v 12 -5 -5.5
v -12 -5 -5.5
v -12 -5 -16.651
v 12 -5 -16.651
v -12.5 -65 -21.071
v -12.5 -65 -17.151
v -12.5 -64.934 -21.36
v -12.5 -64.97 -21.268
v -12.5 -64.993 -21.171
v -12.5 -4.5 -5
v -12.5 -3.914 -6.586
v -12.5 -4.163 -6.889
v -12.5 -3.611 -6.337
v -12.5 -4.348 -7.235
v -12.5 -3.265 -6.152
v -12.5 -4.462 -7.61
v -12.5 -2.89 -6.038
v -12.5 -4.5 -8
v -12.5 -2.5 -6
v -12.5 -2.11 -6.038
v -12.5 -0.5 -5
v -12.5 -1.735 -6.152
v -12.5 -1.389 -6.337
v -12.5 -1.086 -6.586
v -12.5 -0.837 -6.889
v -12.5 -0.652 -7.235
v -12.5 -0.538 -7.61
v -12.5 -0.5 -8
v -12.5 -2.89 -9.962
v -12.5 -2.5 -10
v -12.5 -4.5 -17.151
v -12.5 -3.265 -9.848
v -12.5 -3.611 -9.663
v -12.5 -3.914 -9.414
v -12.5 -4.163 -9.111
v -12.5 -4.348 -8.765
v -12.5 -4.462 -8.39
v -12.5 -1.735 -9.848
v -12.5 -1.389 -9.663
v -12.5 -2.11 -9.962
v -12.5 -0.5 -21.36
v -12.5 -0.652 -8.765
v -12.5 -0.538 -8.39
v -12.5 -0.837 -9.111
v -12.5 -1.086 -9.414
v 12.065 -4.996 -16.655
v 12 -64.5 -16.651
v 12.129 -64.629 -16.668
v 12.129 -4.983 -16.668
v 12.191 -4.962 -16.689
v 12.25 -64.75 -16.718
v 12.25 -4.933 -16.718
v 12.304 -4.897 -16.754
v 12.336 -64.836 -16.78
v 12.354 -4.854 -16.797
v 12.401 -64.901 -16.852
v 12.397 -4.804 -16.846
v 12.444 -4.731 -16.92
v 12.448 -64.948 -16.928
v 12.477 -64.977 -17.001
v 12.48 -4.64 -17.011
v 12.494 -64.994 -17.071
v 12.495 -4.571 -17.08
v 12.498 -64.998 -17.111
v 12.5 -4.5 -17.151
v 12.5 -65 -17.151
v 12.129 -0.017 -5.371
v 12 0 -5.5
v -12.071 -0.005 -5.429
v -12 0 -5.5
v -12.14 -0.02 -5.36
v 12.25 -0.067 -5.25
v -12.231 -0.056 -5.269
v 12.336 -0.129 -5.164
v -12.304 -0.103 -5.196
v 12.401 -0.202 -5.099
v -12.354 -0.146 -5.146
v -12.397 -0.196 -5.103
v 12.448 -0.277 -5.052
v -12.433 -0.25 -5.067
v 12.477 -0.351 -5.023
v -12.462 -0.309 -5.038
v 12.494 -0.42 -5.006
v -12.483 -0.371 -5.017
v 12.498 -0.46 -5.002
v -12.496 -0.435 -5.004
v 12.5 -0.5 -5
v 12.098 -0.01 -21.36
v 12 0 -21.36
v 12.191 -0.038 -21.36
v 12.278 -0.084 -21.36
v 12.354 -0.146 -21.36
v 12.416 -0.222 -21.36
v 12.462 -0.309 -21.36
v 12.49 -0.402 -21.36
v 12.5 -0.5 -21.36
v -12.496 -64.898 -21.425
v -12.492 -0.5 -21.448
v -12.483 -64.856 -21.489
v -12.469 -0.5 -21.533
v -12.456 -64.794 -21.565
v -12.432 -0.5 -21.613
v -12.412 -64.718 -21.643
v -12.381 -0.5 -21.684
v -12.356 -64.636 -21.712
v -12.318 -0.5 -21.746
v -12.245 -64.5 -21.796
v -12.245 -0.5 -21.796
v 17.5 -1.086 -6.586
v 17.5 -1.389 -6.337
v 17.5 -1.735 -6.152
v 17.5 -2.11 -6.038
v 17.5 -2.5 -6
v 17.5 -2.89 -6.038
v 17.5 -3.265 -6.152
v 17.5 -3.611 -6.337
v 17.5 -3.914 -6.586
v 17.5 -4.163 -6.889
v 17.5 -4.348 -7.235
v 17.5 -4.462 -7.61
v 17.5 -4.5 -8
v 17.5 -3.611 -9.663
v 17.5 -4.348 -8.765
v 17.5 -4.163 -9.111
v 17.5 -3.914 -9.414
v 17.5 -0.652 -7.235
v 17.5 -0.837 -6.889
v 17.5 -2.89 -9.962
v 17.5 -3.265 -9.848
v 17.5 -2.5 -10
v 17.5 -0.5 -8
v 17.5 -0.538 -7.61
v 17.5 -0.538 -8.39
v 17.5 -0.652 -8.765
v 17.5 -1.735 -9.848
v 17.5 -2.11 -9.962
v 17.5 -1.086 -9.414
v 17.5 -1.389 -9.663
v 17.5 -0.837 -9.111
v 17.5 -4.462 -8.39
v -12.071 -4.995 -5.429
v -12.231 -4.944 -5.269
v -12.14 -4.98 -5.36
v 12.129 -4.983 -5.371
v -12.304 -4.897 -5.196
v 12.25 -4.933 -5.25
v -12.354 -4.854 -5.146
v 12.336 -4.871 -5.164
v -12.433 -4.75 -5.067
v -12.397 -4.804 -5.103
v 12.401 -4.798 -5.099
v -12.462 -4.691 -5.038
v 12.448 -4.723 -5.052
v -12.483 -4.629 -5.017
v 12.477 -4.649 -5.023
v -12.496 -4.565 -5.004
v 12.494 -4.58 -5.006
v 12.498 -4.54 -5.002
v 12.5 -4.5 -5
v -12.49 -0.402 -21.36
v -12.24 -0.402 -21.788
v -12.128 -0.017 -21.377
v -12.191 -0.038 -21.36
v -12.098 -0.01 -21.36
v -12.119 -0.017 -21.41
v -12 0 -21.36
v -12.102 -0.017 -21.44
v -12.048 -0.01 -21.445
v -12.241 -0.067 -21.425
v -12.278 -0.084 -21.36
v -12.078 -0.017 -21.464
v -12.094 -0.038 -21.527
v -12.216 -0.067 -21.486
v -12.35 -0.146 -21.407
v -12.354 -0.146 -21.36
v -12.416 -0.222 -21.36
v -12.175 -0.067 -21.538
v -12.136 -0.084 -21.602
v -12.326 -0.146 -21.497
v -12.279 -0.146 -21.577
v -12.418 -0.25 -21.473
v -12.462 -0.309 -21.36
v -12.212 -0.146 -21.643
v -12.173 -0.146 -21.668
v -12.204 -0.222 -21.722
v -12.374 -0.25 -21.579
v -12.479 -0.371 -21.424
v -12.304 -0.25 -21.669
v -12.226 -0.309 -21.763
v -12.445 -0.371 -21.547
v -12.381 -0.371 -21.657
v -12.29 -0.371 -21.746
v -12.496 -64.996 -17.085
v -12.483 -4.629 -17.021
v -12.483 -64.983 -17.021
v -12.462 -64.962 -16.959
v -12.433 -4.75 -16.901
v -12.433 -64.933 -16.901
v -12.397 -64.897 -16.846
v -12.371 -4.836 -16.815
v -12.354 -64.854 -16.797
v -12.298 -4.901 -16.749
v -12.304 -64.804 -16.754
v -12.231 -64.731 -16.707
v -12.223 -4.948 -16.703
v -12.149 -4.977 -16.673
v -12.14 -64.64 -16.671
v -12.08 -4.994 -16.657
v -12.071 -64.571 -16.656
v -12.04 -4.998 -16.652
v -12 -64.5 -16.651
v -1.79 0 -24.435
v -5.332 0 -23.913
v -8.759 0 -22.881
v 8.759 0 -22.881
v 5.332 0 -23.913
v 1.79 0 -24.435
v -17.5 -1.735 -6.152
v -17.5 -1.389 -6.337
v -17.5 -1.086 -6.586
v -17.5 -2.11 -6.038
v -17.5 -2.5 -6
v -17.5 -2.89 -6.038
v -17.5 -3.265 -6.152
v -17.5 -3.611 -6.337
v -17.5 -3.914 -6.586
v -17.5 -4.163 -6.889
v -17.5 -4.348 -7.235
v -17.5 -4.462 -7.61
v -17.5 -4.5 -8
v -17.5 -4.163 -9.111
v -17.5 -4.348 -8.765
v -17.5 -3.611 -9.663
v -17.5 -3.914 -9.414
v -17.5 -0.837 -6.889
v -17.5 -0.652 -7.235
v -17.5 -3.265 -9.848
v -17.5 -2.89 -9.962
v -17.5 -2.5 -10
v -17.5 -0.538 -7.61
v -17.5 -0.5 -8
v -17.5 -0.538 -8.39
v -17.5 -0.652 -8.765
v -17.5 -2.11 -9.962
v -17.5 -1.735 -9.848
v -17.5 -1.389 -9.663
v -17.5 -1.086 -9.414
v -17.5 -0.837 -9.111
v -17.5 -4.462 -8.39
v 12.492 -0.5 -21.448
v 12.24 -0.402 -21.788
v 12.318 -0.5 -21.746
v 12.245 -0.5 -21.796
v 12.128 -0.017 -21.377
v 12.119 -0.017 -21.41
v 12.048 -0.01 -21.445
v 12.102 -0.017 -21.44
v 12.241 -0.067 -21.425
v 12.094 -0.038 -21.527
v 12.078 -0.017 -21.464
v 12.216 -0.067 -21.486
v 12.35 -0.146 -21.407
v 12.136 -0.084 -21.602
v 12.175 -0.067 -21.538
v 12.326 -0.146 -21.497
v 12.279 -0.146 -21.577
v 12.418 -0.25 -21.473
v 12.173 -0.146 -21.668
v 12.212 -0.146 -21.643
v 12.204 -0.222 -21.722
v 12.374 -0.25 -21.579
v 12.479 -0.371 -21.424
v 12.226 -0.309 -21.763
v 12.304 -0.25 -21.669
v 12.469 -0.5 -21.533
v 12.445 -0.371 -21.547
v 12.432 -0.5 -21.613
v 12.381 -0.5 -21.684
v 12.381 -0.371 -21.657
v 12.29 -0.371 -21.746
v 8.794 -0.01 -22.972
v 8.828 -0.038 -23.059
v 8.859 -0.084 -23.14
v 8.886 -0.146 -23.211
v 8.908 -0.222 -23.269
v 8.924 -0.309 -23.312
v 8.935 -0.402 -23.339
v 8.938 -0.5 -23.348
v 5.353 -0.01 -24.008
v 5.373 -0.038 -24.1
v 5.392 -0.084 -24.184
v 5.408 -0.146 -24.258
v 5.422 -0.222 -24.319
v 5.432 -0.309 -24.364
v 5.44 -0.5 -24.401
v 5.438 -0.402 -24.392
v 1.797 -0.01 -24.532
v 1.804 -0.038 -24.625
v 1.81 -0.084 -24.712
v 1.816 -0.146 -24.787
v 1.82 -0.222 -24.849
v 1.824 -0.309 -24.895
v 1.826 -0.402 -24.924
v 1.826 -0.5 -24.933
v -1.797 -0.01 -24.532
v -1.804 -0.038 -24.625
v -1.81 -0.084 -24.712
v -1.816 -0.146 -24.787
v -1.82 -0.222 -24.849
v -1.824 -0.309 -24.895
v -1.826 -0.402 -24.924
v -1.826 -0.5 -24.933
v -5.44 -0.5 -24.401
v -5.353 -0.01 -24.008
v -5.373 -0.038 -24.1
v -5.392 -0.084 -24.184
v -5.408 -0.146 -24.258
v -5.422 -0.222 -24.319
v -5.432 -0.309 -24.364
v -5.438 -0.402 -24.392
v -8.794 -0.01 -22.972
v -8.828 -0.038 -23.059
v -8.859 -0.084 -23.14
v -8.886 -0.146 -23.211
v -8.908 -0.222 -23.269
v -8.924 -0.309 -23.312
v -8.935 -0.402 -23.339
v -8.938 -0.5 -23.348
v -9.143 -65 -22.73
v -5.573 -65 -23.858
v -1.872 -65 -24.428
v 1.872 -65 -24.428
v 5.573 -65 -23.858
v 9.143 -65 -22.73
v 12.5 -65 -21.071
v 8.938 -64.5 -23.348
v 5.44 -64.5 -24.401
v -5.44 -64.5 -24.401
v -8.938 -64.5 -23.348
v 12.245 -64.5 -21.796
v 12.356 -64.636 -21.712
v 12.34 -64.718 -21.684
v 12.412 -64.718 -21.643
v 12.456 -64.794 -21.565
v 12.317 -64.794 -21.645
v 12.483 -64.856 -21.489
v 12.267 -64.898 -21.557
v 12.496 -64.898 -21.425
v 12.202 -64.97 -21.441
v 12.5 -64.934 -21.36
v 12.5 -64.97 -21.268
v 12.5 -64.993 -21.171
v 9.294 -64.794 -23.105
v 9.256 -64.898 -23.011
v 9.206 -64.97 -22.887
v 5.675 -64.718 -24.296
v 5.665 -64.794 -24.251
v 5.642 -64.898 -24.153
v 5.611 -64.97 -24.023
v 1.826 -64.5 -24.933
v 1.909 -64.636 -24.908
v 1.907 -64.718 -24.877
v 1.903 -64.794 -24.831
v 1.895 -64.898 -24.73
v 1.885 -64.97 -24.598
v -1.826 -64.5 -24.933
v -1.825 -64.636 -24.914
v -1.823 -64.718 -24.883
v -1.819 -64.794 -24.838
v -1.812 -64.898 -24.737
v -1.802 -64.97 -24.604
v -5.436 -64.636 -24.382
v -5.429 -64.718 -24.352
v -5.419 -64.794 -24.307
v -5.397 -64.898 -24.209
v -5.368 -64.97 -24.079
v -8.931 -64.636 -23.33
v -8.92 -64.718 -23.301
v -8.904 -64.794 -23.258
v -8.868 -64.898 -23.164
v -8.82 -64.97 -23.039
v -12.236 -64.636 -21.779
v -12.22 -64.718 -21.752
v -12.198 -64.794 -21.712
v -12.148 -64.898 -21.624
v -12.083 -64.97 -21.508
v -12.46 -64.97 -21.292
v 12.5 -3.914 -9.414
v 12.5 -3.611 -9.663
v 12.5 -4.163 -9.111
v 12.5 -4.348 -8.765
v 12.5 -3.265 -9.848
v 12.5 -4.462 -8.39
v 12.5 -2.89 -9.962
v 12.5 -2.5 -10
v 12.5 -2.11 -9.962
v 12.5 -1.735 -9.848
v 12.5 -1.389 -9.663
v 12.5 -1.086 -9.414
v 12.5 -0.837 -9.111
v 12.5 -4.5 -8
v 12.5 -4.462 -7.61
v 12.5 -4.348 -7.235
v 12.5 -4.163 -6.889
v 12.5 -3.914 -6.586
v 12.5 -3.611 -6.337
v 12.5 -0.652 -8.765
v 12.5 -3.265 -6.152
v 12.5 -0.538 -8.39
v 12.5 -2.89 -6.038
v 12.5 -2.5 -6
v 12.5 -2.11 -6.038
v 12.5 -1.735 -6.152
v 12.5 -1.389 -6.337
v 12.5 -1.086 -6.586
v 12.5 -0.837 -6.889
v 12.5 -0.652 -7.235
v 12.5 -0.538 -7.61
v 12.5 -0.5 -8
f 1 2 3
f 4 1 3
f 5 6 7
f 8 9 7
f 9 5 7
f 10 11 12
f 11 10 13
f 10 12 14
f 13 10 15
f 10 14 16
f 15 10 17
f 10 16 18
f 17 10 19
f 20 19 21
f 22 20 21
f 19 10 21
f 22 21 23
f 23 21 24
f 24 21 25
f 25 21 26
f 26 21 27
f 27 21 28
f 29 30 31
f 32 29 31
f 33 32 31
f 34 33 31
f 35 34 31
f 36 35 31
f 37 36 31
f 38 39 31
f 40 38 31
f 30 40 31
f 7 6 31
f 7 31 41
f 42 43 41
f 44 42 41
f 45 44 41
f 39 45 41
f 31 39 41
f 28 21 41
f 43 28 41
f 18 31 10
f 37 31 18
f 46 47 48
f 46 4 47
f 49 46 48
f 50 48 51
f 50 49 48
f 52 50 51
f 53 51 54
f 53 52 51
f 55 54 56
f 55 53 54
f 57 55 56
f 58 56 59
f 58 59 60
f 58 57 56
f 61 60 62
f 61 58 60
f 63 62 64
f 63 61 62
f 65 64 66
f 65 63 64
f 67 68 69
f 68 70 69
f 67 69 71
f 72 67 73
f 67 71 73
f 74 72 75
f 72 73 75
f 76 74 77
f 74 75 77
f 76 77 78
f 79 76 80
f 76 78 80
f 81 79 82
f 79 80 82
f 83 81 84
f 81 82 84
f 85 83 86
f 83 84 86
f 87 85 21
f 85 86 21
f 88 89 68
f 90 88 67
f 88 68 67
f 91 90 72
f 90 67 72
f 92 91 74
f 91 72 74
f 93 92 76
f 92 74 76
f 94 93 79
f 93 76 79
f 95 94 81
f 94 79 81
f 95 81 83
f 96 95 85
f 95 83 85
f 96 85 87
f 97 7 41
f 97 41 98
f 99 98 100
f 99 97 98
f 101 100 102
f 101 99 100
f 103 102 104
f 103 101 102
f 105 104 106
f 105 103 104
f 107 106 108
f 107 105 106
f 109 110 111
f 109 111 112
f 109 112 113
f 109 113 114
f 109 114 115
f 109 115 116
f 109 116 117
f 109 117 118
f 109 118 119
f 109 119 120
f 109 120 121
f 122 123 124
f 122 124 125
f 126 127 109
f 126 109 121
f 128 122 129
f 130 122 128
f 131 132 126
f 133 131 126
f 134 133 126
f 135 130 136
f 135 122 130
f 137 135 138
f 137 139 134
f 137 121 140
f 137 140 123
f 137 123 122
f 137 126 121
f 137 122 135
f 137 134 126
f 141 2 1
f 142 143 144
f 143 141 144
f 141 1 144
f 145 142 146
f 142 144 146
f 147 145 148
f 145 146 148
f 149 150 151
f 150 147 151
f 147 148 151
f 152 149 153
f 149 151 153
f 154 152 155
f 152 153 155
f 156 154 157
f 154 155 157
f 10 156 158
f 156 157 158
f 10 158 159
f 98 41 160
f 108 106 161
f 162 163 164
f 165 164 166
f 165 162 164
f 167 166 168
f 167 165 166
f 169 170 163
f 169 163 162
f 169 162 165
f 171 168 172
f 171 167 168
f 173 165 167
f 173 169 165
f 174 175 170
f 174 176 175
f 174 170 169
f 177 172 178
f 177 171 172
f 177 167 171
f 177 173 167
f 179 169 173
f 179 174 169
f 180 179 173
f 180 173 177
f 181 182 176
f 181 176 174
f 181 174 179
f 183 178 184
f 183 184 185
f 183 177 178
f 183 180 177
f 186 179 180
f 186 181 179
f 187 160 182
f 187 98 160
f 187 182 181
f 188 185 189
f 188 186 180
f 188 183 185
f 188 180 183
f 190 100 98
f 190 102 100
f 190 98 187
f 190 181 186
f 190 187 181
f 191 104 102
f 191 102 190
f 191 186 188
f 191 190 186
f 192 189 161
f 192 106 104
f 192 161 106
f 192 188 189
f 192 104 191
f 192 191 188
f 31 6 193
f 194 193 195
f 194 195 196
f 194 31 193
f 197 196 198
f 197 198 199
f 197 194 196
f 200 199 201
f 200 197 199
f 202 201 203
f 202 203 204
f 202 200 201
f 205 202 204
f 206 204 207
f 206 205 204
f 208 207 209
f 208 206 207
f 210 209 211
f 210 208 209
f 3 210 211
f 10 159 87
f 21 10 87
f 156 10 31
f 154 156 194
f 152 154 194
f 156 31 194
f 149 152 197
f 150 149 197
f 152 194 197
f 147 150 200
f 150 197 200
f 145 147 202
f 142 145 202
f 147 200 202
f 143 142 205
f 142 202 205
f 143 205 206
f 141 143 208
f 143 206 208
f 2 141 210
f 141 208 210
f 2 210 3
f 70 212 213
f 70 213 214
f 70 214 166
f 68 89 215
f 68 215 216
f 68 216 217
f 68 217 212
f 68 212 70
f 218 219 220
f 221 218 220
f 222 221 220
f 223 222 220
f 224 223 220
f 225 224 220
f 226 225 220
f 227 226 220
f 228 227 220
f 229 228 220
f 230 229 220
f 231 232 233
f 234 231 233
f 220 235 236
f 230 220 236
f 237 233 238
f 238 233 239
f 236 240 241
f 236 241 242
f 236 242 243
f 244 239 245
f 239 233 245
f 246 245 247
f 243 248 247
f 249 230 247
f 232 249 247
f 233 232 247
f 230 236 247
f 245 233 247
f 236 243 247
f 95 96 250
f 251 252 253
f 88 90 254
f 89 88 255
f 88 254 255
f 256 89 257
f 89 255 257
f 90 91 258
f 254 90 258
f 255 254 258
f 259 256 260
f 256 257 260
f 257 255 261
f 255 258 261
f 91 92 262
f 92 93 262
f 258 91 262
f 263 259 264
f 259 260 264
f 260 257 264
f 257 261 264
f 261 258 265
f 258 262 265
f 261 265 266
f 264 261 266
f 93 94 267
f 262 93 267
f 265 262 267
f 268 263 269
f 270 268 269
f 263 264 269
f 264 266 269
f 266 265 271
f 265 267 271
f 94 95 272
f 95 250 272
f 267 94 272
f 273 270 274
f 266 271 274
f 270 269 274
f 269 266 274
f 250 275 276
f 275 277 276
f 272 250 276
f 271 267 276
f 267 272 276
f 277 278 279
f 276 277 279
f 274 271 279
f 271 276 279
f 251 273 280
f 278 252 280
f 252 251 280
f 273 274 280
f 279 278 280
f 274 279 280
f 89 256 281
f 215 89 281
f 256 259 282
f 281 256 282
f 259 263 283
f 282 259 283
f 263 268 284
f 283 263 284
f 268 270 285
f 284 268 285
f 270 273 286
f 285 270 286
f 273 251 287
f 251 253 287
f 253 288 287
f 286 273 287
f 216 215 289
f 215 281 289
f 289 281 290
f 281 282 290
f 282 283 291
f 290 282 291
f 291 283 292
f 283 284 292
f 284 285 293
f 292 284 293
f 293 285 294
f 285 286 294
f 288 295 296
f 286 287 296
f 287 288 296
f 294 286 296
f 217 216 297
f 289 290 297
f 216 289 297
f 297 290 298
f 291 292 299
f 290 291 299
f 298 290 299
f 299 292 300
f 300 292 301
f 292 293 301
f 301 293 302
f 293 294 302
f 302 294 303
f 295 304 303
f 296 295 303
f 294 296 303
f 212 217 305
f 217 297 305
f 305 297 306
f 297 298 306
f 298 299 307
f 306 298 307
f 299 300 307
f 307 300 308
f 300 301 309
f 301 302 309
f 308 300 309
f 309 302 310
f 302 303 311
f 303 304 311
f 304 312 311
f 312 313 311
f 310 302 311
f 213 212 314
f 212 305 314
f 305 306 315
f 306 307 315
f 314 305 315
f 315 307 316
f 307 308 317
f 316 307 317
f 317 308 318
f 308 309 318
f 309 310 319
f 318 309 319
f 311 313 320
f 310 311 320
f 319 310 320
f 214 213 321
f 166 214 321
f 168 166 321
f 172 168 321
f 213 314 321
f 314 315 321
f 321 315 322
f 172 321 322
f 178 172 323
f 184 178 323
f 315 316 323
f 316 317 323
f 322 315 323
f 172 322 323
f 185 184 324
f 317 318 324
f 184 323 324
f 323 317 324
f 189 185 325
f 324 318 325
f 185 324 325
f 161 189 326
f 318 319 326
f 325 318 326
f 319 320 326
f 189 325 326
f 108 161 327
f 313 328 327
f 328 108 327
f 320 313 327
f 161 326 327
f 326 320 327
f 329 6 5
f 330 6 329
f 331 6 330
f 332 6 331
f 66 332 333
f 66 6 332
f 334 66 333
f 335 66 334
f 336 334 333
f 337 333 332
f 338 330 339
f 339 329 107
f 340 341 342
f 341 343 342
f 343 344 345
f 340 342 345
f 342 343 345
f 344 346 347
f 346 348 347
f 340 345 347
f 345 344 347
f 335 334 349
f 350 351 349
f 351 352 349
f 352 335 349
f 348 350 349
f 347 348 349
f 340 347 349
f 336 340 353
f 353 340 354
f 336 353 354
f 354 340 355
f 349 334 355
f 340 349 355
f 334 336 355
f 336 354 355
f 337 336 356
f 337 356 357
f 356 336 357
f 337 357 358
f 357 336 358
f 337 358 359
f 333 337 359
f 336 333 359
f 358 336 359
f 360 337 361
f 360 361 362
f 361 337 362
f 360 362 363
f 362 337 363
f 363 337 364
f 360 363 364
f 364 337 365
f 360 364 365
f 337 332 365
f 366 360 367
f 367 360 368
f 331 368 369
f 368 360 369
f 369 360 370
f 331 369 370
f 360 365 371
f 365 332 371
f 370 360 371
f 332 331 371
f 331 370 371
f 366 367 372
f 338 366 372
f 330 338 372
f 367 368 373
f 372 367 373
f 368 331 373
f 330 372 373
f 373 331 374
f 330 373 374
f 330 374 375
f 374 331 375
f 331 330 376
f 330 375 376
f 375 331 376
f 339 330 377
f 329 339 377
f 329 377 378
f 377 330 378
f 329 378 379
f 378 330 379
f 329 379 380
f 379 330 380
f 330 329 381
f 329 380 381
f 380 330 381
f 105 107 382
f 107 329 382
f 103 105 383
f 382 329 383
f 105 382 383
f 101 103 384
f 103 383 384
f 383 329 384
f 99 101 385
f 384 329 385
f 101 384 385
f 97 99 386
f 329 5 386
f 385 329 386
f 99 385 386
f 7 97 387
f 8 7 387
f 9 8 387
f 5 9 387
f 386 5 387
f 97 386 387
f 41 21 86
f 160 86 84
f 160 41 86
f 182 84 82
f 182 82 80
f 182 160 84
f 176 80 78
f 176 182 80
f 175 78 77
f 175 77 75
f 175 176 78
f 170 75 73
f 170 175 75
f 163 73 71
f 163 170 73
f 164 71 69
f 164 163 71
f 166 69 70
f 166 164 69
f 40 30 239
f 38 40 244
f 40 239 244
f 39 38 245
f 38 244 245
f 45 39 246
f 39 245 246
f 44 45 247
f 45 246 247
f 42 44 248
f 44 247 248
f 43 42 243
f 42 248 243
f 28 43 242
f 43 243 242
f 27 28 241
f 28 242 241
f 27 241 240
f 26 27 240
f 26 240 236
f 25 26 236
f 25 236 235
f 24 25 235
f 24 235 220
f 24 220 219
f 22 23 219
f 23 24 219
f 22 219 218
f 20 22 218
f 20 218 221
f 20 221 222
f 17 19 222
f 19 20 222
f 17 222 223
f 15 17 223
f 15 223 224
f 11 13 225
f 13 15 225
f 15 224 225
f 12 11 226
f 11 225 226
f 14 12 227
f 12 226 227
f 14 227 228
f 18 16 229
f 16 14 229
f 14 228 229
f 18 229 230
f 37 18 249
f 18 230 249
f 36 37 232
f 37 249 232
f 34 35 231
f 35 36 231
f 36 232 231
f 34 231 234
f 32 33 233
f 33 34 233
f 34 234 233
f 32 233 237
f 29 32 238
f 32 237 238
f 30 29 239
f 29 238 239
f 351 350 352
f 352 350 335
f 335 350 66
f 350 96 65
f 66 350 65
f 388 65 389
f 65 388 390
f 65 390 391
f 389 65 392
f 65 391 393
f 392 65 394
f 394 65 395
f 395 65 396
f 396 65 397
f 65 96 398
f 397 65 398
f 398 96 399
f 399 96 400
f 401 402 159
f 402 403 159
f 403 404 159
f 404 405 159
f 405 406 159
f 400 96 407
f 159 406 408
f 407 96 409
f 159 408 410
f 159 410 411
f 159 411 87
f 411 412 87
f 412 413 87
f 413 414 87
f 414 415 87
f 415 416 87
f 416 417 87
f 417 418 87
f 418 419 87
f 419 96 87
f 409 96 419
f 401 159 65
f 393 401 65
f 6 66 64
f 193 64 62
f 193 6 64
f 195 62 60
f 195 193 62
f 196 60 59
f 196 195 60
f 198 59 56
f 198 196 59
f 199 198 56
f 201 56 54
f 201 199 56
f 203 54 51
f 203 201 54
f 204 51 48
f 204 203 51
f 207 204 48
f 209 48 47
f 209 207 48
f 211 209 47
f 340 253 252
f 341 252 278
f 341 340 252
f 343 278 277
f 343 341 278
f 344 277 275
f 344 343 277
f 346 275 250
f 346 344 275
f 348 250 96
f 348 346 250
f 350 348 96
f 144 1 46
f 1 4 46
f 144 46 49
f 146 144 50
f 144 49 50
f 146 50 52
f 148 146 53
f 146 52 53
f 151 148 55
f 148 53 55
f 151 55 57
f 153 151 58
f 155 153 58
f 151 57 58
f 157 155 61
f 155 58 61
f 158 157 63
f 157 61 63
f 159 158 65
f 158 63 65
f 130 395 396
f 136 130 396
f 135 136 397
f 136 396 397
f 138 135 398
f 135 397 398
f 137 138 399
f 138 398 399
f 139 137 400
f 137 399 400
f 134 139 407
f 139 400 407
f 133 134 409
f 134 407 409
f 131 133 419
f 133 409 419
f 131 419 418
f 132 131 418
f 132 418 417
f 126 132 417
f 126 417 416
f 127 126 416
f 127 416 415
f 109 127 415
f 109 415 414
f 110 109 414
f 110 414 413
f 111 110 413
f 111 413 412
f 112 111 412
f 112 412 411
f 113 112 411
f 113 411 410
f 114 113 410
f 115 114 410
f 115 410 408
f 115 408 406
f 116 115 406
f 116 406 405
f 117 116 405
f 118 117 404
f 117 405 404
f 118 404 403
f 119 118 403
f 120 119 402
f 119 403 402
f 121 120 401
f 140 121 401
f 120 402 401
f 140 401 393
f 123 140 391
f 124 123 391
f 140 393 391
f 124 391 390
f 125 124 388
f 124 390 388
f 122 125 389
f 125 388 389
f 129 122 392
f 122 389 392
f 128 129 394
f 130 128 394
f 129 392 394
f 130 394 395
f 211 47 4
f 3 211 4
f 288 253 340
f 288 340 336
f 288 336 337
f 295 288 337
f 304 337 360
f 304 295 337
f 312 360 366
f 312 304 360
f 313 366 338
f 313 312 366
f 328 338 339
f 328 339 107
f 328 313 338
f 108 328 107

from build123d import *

# Parameters (mm, degrees)
SKETCH1_R                = 25
BOSS_EXTRUDE1_DEPTH      = 69
CUT_EXTRUDE3_DEPTH       = 69
SKETCH8_W                = 47.613521064
SKETCH8_H                = 96.094714493
CUT_EXTRUDE6_DEPTH       = 69
SKETCH9_W                = 16.650635095
SKETCH9_H                = 64
CUT_EXTRUDE7_DEPTH       = 69
SKETCH10_W               = 5
SKETCH10_H               = 9.23187044
CUT_EXTRUDE8_DEPTH       = 69
BOSS_EXTRUDE2_DEPTH      = 5
BOSS_EXTRUDE2_DEPTH_BACK = 30
SKETCH11_R               = 2
SKETCH12_W               = 21.924143589
SKETCH12_H               = 4
CUT_EXTRUDE9_DEPTH       = 80.284298572
FILLET1_R                = 0.5


with BuildPart() as part:
    # Sketch1 → Boss-Extrude1 (new body)
    with BuildSketch(Plane(origin=(0, 0, 0), x_dir=(1, 0, 0), z_dir=(0, 1, 0))):
        with Locations(Location((0, 0, 0), (0, 0, 270))):
            Circle(SKETCH1_R)
    extrude(amount=-BOSS_EXTRUDE1_DEPTH)

    # Sketch2 → Cut-Extrude3 (cut)
    with BuildSketch(Plane(origin=(0, 0, 0), x_dir=(1, 0, 0), z_dir=(0, 1, 0))):
        with BuildLine():
            Line((-12.5, -21.650635095), (-12.5, 21.650635095))
            ThreePointArc((-12.5, 21.650635095), (-25, 0), (-12.5, -21.650635095))
        make_face()
        with BuildLine():
            ThreePointArc((25, 0), (21.650635095, 12.5), (12.5, 21.650635095))
            Line((12.5, 21.650635095), (12.5, -21.650635095))
            ThreePointArc((12.5, -21.650635095), (21.650635095, -12.5), (25, 0))
        make_face()
    extrude(amount=-CUT_EXTRUDE3_DEPTH, mode=Mode.SUBTRACT)

    # Sketch8 → Cut-Extrude6 (cut)
    with BuildSketch(Plane(origin=(12.5, 0, 0), x_dir=(0, 0, -1), z_dir=(1, 0, 0))):
        with Locations((-23.806760532, -34.608459046)):
            Rectangle(SKETCH8_W, SKETCH8_H)
    extrude(amount=-CUT_EXTRUDE6_DEPTH, mode=Mode.SUBTRACT)

    # Sketch9 → Cut-Extrude7 (cut)
    with BuildSketch(Plane(origin=(12.5, 0, 0), x_dir=(0, 0, -1), z_dir=(1, 0, 0))):
        with Locations((8.325317548, -37)):
            Rectangle(SKETCH9_W, SKETCH9_H)
    extrude(amount=-CUT_EXTRUDE7_DEPTH, mode=Mode.SUBTRACT)

    # Sketch10 → Cut-Extrude8 (cut)
    with BuildSketch(Plane(origin=(12.5, 0, 0), x_dir=(0, 0, -1), z_dir=(1, 0, 0))):
        with Locations((2.5, -4.61593522)):
            Rectangle(SKETCH10_W, SKETCH10_H)
    extrude(amount=-CUT_EXTRUDE8_DEPTH, mode=Mode.SUBTRACT)

    # Sketch11 → Boss-Extrude2 (add, two sides: drawn at the far end of the back side and taken through both)
    with BuildSketch(Plane(origin=(12.5, 0, 0), x_dir=(0, 0, -1), z_dir=(1, 0, 0)).offset(-BOSS_EXTRUDE2_DEPTH_BACK)):
        with Locations((8, -2.5)):
            Circle(SKETCH11_R)
    extrude(amount=BOSS_EXTRUDE2_DEPTH + BOSS_EXTRUDE2_DEPTH_BACK)

    # Sketch12 → Cut-Extrude9 (cut, through all)
    with BuildSketch(Plane(origin=(12.5, 0, 0), x_dir=(0, 0, -1), z_dir=(1, 0, 0))):
        with Locations((27.61270689, -67)):
            Rectangle(SKETCH12_W, SKETCH12_H)
    extrude(amount=-CUT_EXTRUDE9_DEPTH, mode=Mode.SUBTRACT)

    # Fillet1
    fillet1_edges = [part.edges().sort_by_distance(p)[0] for p in [
        (12.5, -35, -16.650635095),
        (0, -65, -16.650635095),
        (-12.5, -32.5, -21.650635095),
        (12.5, -32.5, -21.650635095),
        (0, -65, -25),
        (-12.5, 0, -13.325317547),
        (12.5, 0, -13.325317547),
        (-12.5, -35, -16.650635095),
        (12.5, -5, -10.825317547),
        (0, 0, -25),
        (-12.5, -5, -10.825317547),
        (0, -5, -5),
        (0, 0, -5),
    ]]
    fillet(fillet1_edges, radius=FILLET1_R - 0.0001)  # a hair under: the kernel refuses the full size


solid = part.part
